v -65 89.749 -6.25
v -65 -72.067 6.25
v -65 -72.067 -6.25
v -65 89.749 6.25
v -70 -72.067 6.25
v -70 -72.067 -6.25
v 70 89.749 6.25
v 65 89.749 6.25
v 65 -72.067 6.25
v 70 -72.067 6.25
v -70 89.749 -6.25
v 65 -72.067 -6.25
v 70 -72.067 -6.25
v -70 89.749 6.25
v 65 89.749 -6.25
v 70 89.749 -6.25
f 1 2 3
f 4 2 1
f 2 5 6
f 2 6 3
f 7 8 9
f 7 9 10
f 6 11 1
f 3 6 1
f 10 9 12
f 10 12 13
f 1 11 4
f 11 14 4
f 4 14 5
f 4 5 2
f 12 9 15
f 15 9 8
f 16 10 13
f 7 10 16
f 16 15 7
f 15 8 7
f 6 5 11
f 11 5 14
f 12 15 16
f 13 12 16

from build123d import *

# Parameters (mm, degrees)
SKETCH_2_W        = 5
SKETCH_2_H        = 161.81563722
EXTRUDE_2_DEPTH   = 6.25
EXTRUDE_2_2_DEPTH = 6.25


with BuildPart() as part:
    # 스케치2 → 보스-돌출2 (new body, symmetric)
    with BuildSketch(Plane.XY):
        with Locations((-67.5, 8.84115151)):
            Rectangle(SKETCH_2_W, SKETCH_2_H)
    extrude(amount=EXTRUDE_2_DEPTH, both=True)


with BuildPart() as body_2:
    # 스케치2 → Extrude 2 2 (new body, symmetric)
    with BuildSketch(Plane.XY):
        with Locations((67.5, 8.84115151)):
            Rectangle(SKETCH_2_W, SKETCH_2_H)
    extrude(amount=EXTRUDE_2_2_DEPTH, both=True)


solid = Compound([part.part, body_2.part])
